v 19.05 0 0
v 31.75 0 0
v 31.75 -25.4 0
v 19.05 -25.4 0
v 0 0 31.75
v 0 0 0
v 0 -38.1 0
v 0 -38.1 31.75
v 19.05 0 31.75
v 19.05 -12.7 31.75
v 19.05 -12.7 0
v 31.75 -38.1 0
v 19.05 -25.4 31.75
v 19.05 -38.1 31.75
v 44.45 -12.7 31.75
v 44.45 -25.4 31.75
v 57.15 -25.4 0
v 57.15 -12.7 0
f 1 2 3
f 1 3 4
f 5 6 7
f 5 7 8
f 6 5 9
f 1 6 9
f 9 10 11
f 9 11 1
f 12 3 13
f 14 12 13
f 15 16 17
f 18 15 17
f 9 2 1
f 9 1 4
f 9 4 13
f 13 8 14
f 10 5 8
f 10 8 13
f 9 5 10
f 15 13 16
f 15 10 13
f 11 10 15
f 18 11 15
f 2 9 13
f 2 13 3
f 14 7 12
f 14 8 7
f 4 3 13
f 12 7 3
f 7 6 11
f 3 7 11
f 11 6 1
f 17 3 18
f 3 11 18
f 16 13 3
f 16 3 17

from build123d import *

# Parameters (mm, degrees)
F0_W     = 57.15
F0_H     = 31.75
F1_DEPTH = 38.1
F2_W     = 38.1
F2_H     = 12.7
F3_DEPTH = 31.75
F5_DEPTH = 12.7
F7_DEPTH = 25.4
F9_DEPTH = 25.4


with BuildPart() as f1:
    # F0 (on Front) → F1 (new body)
    with BuildSketch(Plane.XZ):
        with Locations((28.575, 15.875)):
            Rectangle(F0_W, F0_H)
    extrude(amount=F1_DEPTH)

    # F2 (on face) → F3 (cut)
    with BuildSketch(Plane.XY.offset(31.75)):
        with Locations((38.1, -31.75)):
            Rectangle(F2_W, F2_H)
        with Locations((38.1, -6.35)):
            Rectangle(F2_W, F2_H)
    extrude(amount=-F3_DEPTH, mode=Mode.SUBTRACT)

    # F4 (on face) → F5 (join)
    with BuildSketch(Plane.XZ.offset(25.4)):
        Polygon((19.05, 31.75), (19.05, 0), (31.75, 0), align=None)
    extrude(amount=F5_DEPTH)

    # F8 (on face) → F9 (cut)
    with BuildSketch(Plane.XZ.offset(25.4)):
        Polygon((57.15, 31.75), (44.45, 31.75), (57.15, 0), align=None)
    extrude(amount=-F9_DEPTH, mode=Mode.SUBTRACT)


with BuildPart() as f7:
    # F6 (on face) → F7 (new body)
    with BuildSketch(Plane(origin=(0, 0, 0), x_dir=(-1, 0, 0), z_dir=(0, 1, 0))):
        Polygon((-31.75, 0), (-19.05, 0), (-19.05, 31.75), align=None)
    extrude(amount=-F7_DEPTH)


solid = Compound([f1.part, f7.part])
